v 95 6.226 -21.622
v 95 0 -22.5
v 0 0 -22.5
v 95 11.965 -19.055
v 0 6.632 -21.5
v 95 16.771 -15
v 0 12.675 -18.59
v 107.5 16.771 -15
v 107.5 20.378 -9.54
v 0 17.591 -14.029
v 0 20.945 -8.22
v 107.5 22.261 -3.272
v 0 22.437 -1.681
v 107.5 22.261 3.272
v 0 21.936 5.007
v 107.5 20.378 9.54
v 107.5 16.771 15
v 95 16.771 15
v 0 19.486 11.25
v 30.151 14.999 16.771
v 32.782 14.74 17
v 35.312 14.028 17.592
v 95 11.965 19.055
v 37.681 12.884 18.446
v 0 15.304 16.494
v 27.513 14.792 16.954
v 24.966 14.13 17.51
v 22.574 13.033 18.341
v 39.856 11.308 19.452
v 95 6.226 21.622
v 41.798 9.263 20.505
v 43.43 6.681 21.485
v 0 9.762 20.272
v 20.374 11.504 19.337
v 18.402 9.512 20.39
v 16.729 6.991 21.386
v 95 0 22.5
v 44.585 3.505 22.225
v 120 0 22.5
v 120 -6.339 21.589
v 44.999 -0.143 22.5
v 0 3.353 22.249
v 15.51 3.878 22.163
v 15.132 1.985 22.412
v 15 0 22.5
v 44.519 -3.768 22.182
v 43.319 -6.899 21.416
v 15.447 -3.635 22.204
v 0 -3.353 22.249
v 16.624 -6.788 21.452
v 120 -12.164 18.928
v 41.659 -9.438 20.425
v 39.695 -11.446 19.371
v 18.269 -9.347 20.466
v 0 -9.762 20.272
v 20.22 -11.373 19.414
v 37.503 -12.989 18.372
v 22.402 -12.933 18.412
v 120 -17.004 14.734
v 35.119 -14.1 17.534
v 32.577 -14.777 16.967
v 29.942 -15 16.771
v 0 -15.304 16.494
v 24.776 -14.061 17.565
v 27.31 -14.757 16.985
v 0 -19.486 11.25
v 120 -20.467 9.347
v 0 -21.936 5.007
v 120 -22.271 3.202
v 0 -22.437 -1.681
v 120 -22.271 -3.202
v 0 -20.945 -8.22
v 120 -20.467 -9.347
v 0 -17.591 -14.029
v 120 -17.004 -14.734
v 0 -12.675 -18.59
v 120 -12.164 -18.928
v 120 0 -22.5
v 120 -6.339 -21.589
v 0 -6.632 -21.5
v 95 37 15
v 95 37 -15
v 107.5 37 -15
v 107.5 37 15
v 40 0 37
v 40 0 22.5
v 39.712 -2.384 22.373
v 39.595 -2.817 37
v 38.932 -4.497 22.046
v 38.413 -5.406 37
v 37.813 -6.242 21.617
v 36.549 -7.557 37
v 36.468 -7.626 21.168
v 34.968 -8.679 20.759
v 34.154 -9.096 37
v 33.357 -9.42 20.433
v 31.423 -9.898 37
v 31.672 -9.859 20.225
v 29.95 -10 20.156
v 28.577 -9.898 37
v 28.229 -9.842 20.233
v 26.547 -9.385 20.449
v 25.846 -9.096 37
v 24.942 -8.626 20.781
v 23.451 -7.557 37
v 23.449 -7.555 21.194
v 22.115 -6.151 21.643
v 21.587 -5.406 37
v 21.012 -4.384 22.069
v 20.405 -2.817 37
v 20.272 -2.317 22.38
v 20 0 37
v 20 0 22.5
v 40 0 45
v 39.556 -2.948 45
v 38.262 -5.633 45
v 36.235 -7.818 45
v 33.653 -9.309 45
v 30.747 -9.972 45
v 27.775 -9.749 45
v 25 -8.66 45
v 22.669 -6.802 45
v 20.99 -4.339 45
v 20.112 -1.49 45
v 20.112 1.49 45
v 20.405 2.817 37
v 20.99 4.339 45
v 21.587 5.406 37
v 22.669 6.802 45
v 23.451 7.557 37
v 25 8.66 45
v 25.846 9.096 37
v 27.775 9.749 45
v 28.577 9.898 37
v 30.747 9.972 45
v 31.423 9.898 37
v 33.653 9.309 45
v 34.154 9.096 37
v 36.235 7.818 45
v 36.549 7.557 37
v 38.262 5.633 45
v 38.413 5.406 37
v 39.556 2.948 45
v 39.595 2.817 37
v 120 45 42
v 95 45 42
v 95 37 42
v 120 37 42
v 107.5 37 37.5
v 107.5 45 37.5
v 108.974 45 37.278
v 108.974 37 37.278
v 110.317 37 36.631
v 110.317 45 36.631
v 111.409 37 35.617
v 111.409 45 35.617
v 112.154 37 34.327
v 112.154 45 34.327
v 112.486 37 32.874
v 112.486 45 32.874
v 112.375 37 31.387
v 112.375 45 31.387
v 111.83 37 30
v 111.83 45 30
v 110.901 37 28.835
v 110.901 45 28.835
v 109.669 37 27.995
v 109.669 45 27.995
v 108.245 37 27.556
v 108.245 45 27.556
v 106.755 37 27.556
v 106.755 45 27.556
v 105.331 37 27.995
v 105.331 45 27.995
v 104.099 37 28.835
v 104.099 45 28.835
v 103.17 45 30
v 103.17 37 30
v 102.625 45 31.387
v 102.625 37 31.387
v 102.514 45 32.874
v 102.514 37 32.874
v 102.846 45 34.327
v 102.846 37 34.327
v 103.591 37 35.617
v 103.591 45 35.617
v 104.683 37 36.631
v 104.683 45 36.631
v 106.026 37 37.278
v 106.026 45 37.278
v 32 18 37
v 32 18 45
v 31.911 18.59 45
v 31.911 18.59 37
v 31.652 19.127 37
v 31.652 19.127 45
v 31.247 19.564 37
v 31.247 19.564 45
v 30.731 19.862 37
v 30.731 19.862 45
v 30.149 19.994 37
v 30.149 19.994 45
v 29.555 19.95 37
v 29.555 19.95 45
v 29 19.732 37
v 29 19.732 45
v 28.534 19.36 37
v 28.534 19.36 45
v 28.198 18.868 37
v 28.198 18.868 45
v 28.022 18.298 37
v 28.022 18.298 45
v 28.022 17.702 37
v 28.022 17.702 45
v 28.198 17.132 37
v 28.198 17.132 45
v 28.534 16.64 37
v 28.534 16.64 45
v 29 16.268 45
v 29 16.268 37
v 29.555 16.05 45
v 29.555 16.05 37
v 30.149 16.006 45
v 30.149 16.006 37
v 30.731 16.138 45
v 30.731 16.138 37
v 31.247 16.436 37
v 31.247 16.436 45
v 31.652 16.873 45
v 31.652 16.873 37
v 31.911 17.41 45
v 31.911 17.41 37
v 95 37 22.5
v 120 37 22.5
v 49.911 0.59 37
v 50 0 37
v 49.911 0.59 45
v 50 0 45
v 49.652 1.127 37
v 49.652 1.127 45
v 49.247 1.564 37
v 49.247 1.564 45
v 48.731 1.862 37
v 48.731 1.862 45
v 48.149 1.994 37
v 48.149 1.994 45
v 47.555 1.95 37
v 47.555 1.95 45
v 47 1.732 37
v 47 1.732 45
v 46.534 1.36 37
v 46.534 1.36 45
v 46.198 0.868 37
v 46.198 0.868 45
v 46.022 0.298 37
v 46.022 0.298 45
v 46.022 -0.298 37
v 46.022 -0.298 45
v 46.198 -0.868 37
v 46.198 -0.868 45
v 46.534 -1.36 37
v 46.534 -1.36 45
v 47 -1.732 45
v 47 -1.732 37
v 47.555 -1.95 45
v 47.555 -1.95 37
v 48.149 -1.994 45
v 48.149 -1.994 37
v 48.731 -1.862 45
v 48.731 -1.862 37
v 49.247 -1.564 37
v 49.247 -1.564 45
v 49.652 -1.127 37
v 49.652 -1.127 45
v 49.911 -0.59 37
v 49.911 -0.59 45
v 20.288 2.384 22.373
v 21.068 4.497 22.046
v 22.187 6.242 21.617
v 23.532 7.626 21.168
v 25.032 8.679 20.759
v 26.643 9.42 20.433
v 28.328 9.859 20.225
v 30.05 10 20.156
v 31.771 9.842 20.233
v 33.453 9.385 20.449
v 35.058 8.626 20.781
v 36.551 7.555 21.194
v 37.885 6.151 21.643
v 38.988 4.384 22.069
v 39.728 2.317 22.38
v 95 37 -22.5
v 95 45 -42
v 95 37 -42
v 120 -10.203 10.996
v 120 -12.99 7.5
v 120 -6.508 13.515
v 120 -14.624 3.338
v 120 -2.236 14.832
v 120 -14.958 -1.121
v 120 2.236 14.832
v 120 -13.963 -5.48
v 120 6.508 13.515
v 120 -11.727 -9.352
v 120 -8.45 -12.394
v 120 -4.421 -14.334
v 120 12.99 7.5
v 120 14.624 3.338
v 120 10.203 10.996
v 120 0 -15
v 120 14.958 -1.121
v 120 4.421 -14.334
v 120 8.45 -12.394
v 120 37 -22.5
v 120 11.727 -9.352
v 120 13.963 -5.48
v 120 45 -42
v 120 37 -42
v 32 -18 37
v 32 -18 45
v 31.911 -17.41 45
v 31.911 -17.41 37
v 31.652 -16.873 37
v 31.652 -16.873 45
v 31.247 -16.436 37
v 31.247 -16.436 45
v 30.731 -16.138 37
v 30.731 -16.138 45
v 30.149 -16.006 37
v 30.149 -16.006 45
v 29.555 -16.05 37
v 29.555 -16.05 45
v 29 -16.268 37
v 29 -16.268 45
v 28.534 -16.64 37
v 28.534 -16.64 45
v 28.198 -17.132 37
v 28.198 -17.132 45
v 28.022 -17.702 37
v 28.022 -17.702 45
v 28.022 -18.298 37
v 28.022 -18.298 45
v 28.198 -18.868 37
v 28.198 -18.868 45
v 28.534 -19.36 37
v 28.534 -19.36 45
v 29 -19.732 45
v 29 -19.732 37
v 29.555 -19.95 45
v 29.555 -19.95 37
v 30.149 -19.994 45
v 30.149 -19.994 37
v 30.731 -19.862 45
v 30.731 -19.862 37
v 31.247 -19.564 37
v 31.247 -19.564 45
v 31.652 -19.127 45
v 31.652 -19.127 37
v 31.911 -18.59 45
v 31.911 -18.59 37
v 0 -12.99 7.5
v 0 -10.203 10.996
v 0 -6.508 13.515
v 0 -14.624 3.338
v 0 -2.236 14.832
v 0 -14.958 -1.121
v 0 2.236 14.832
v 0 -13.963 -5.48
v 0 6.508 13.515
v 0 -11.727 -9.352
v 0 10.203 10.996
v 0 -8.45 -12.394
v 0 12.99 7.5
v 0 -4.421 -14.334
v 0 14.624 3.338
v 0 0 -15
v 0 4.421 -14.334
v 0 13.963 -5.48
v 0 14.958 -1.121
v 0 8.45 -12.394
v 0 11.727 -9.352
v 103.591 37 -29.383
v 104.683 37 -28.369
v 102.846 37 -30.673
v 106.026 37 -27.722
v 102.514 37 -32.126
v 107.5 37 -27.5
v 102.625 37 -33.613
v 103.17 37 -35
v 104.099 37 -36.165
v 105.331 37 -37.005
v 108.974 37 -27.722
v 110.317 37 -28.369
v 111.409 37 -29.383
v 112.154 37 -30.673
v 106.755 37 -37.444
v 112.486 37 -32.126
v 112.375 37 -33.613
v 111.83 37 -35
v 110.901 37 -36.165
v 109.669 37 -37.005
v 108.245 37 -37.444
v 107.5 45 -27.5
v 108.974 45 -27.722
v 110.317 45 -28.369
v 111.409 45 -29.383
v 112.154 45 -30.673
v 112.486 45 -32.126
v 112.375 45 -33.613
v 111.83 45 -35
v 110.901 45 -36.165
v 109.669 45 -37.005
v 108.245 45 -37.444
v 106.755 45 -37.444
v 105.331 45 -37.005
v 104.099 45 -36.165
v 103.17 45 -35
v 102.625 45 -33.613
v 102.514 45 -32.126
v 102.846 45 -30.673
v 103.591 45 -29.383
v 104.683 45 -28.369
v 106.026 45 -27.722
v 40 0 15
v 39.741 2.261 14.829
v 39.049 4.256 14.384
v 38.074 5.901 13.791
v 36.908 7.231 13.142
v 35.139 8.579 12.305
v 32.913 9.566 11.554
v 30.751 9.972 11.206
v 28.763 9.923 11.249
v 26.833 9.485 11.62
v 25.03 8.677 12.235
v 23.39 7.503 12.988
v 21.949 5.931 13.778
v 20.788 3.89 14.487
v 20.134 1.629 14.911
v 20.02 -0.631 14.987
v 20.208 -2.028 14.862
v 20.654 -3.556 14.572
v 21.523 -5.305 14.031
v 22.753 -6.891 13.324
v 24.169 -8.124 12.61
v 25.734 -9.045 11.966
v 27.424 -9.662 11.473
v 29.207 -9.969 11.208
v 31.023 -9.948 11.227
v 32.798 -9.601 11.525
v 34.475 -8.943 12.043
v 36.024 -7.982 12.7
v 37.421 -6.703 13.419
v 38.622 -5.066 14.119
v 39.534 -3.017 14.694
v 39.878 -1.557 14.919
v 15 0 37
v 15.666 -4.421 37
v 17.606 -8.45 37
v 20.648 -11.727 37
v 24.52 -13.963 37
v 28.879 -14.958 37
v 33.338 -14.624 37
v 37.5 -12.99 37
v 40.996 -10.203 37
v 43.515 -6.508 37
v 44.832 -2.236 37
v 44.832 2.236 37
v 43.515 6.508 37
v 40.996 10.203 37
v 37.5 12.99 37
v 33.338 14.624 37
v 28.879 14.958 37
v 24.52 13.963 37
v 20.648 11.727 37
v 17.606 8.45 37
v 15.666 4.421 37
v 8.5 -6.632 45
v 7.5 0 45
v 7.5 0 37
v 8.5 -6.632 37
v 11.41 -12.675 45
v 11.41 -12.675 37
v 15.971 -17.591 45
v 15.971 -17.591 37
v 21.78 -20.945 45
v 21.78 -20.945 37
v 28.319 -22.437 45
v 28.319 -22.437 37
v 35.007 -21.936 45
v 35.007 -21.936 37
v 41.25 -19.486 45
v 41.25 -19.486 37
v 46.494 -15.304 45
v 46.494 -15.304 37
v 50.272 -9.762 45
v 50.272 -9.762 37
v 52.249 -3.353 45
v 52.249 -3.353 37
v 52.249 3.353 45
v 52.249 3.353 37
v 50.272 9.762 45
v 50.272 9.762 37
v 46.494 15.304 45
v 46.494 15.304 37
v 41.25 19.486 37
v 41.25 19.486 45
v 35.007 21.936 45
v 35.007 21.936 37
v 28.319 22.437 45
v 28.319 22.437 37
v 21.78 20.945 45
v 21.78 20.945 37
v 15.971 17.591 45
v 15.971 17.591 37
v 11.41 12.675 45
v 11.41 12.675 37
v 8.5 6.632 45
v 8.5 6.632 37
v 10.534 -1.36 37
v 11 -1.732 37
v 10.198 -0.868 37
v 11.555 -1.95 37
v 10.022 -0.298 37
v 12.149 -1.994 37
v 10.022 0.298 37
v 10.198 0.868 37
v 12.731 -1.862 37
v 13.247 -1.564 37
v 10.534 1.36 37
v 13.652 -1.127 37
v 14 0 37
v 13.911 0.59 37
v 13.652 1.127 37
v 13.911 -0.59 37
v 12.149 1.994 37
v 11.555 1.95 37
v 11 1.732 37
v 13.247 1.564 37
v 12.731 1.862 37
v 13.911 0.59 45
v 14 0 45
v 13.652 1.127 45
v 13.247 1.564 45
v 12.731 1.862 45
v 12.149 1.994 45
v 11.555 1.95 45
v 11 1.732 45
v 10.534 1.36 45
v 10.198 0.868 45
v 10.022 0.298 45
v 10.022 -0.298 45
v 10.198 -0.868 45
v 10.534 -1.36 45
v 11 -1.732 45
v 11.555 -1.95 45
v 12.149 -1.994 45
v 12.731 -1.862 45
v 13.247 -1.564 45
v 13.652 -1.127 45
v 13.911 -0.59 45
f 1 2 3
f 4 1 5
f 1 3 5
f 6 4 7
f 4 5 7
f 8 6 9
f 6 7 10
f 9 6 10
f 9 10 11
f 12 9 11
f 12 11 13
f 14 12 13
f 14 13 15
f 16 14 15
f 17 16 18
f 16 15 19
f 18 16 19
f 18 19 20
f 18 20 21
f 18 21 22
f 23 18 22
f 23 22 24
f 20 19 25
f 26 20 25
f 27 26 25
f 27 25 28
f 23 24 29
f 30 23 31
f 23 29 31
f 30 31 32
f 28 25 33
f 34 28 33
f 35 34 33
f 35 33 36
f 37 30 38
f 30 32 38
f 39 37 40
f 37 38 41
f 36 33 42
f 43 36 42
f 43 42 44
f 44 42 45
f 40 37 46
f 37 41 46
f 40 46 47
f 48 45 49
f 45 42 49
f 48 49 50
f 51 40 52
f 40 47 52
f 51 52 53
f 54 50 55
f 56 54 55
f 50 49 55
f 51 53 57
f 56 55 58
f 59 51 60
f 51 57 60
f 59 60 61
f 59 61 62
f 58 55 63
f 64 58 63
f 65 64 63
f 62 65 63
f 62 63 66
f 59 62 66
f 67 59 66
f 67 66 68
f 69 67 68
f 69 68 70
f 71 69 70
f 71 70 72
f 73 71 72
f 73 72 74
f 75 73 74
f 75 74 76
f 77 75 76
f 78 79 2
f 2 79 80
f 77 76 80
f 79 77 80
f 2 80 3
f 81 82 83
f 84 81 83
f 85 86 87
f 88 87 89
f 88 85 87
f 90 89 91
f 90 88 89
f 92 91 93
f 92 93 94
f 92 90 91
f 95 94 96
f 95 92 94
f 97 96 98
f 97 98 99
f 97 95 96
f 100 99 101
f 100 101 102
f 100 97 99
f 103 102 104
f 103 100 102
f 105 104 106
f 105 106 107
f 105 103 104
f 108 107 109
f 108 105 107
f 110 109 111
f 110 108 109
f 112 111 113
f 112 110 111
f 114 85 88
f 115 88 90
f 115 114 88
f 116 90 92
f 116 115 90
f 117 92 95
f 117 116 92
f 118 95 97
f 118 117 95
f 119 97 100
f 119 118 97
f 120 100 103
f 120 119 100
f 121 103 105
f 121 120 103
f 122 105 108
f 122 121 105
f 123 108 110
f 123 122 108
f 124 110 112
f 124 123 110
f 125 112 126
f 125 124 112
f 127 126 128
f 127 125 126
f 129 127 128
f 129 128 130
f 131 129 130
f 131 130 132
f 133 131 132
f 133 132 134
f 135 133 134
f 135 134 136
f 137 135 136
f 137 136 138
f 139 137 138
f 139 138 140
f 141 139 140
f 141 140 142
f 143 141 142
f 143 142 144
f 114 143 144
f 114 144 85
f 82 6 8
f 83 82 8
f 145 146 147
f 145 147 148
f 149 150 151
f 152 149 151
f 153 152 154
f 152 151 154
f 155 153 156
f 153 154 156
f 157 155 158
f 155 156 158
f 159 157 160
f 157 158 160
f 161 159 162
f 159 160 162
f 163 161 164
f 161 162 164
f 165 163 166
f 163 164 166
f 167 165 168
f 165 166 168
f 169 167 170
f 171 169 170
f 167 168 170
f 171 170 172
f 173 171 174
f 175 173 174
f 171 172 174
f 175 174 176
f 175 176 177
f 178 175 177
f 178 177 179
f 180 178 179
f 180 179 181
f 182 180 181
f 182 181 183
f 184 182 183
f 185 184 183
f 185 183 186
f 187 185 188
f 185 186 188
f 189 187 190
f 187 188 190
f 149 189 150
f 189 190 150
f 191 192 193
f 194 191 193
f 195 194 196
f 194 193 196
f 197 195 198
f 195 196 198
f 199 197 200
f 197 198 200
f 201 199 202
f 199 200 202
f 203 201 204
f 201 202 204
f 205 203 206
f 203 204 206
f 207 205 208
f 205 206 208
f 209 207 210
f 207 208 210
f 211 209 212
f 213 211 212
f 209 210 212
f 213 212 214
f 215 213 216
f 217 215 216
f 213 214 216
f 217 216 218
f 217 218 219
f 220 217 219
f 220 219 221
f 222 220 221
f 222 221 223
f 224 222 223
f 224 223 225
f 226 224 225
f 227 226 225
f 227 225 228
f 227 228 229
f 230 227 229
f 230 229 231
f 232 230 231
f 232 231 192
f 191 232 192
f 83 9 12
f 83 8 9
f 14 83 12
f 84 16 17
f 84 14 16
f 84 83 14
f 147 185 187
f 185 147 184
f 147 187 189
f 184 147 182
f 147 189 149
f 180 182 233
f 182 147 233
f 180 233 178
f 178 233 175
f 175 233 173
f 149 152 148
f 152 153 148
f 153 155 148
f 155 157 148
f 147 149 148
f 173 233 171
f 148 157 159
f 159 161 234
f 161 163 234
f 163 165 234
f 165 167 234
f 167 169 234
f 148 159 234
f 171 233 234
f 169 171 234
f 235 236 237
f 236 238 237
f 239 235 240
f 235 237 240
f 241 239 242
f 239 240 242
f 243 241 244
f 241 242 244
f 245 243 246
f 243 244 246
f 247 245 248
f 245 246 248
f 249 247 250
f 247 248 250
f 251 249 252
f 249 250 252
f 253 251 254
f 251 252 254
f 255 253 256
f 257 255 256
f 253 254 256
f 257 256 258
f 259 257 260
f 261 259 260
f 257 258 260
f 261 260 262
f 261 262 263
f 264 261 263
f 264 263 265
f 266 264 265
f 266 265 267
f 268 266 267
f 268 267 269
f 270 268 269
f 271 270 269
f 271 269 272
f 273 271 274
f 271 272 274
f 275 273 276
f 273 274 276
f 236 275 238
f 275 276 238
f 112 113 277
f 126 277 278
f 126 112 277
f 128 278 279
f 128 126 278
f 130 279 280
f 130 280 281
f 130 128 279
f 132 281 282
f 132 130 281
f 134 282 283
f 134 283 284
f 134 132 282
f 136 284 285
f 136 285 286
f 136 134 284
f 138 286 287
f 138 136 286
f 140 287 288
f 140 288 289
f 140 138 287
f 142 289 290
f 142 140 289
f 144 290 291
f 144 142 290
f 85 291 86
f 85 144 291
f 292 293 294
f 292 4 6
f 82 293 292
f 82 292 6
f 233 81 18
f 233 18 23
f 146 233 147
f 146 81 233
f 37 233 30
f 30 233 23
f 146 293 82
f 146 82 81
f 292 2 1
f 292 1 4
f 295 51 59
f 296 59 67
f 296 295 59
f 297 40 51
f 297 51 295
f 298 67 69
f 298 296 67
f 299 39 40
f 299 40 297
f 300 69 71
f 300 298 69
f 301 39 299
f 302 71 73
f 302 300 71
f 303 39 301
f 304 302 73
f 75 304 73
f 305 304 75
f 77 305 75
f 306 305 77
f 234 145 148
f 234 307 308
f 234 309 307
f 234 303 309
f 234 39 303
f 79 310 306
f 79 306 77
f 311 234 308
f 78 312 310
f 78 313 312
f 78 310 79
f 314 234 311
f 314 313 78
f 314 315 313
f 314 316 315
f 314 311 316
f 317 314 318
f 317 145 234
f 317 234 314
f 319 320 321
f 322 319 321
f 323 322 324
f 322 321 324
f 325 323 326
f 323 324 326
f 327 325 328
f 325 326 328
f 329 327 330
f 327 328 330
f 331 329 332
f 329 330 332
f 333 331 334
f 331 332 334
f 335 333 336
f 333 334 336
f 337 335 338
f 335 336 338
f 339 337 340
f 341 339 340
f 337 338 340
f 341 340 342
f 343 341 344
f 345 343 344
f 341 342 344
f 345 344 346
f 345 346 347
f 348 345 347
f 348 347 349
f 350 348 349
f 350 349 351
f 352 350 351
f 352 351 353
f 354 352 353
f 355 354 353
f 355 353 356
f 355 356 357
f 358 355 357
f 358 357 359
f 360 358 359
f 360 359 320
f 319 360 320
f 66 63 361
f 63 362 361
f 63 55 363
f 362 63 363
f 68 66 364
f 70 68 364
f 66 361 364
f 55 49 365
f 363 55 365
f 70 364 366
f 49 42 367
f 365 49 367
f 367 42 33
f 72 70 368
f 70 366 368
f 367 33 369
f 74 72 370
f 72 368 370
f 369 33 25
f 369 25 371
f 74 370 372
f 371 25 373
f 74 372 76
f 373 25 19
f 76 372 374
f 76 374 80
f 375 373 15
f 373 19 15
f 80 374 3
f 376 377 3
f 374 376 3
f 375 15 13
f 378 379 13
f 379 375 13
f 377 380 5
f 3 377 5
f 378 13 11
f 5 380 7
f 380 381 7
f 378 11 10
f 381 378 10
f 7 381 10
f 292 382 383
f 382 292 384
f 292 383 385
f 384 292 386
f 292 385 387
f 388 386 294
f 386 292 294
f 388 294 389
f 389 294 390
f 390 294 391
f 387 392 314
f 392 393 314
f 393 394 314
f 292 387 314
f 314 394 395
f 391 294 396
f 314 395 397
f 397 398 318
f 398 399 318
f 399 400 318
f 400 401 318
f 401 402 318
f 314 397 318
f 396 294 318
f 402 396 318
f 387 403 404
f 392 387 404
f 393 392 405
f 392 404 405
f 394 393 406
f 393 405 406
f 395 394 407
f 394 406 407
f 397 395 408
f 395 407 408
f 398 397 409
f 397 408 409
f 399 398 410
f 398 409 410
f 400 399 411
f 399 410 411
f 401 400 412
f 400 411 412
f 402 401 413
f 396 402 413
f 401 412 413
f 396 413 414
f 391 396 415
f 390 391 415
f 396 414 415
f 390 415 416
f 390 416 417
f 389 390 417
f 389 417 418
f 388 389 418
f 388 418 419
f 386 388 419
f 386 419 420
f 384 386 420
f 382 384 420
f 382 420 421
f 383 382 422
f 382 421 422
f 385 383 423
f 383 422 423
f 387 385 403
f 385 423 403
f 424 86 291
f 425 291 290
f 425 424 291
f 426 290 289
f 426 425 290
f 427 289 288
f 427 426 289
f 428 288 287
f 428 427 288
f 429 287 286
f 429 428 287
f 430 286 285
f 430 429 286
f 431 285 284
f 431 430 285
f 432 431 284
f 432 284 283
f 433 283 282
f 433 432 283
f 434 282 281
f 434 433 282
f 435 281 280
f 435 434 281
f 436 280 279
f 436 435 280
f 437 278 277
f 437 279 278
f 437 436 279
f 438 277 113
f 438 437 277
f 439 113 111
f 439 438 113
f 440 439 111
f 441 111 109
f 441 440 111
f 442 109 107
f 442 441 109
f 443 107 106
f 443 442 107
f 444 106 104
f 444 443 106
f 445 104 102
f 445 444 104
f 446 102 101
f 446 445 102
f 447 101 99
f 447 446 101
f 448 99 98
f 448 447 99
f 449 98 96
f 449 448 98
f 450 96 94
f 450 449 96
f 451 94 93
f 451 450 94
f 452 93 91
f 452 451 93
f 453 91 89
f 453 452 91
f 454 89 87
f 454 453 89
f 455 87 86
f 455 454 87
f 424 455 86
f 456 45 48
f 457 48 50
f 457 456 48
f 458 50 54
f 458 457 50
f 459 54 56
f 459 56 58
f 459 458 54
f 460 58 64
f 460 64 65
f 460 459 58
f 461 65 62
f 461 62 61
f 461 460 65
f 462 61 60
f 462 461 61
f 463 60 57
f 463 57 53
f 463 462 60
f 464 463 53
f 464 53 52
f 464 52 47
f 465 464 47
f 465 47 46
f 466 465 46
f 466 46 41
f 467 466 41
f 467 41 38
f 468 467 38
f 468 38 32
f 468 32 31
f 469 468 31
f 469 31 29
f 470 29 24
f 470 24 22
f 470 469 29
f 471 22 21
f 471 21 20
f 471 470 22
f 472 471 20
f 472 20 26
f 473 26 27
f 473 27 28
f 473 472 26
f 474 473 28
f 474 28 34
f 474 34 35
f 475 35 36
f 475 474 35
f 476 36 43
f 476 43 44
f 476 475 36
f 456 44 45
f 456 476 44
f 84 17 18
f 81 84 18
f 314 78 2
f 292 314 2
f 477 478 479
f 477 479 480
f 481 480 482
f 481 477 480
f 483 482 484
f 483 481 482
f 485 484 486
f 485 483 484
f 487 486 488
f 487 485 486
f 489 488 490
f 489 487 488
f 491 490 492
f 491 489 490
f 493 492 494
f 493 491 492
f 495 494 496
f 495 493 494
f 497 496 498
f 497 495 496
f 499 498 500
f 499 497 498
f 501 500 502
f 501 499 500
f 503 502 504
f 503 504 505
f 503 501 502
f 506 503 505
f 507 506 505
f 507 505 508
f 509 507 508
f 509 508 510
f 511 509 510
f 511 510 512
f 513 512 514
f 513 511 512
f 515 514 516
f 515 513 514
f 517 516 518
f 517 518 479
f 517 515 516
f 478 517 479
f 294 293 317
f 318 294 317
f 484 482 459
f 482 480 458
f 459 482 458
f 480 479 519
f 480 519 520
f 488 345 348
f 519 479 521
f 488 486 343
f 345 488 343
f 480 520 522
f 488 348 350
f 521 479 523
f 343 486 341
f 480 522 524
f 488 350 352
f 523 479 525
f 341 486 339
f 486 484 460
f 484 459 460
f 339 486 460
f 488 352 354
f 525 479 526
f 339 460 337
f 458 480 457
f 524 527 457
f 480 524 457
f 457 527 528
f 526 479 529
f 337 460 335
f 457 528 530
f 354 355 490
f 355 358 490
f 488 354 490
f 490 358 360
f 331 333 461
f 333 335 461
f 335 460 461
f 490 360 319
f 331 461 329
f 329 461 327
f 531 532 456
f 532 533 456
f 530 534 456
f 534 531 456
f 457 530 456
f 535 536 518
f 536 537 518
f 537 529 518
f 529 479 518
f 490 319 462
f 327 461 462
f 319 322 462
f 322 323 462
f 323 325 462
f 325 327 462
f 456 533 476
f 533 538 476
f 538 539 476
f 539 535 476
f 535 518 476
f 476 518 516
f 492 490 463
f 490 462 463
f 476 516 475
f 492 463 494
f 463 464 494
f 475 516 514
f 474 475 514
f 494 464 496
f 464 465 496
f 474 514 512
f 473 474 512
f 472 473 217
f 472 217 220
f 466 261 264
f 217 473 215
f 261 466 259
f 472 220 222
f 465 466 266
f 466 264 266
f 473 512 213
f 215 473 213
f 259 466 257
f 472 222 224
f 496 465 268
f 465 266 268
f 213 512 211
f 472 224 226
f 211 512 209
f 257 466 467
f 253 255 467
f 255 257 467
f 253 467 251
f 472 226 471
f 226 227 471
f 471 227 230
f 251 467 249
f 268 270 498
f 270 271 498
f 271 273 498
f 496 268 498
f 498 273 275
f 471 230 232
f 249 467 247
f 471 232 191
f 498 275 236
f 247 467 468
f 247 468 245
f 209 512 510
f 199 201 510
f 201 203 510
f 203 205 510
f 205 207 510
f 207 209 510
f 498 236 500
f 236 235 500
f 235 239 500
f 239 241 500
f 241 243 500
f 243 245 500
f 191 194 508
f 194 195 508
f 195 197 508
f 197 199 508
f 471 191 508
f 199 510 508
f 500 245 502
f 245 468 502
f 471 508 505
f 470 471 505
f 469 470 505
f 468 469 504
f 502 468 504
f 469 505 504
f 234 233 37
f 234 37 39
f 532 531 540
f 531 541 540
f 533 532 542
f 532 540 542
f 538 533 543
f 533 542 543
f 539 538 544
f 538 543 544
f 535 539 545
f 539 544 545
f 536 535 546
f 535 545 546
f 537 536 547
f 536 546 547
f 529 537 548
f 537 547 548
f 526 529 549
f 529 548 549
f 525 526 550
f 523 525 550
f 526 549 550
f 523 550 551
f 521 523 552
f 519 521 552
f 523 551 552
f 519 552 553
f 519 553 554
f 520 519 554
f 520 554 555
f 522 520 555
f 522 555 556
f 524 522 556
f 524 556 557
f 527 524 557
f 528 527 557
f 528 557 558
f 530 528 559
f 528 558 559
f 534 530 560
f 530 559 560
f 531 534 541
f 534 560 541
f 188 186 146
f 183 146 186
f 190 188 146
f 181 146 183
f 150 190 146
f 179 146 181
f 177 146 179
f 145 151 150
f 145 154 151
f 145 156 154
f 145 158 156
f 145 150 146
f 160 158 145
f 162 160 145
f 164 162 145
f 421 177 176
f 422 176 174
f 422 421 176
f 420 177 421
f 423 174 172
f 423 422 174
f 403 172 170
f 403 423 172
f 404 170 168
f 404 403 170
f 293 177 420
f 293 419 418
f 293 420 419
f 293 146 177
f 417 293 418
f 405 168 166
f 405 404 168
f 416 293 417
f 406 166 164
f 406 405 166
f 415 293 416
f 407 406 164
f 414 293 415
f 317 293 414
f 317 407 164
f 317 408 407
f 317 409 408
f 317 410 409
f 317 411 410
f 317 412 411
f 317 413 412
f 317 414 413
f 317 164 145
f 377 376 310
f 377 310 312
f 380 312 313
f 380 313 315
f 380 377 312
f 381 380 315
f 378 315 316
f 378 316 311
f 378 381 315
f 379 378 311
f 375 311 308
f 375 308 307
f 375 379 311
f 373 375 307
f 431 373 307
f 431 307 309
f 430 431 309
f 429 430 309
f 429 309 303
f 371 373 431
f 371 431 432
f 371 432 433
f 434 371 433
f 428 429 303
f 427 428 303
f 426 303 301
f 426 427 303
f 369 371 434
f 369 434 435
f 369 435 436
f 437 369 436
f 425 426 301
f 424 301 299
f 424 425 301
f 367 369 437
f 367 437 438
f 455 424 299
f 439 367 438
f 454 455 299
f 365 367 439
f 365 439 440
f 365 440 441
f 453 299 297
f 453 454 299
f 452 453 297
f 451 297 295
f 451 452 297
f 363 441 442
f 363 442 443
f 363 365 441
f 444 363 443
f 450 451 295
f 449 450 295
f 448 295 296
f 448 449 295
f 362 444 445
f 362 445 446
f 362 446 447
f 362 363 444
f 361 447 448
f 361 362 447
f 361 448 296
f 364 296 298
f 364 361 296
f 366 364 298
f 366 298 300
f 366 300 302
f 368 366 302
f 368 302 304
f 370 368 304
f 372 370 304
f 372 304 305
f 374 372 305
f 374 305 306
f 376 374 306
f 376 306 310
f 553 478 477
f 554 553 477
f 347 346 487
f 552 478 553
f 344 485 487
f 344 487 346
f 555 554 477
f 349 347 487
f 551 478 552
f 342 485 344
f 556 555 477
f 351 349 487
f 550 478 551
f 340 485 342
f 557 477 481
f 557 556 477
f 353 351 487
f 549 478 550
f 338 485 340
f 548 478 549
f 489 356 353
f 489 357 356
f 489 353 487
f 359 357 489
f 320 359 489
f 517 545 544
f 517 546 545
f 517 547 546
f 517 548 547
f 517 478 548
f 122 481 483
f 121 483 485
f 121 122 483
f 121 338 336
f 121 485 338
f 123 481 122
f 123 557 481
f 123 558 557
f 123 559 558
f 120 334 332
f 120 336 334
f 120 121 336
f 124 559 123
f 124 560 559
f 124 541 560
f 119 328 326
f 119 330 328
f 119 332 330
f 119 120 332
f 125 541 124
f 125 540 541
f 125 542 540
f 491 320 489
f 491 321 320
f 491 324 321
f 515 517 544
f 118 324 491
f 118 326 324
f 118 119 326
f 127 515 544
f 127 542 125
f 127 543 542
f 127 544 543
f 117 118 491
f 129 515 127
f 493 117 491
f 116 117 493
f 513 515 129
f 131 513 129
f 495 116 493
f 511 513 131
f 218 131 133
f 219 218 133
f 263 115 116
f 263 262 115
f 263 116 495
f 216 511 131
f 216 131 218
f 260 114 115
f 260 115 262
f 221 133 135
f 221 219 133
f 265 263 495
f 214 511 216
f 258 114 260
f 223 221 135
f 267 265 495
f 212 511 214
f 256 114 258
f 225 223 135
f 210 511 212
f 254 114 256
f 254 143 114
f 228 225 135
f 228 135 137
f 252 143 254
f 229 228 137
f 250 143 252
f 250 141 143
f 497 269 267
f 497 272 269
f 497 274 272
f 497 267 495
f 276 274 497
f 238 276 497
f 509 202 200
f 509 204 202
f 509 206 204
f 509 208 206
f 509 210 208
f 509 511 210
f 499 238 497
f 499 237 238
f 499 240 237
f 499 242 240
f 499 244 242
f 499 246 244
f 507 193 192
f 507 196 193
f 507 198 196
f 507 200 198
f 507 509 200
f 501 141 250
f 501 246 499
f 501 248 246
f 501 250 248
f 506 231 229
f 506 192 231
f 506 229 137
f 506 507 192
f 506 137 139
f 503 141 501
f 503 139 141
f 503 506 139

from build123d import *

# Parameters (mm, degrees)
SKETCH_1_R           = 22.5
SKETCH_1_R_2         = 15
EXTRUDE_1_DEPTH      = 120
EXTRUDE_START        = 45
SKETCH_2_W           = 25
SKETCH_2_H           = 19.5
SKETCH_2_R           = 5
SKETCH_2_W_2         = 12.5
SKETCH_2_H_2         = 15
EXTRUDE_5_DEPTH      = 8
EXTRUDE_6_REACH      = 173.867
EXTRUDE_6_END_RADIUS = 22.5
EXTRUDE_START_2      = 37
EXTRUDE_7_DEPTH      = 8
EXTRUDE_8_REACH      = 174.831
EXTRUDE_8_END_RADIUS = 22.5
CUT_EXTRUDE_1_REACH  = 137.831
SKETCH_3_4_R         = 10
CUT_EXTRUDE_2_REACH  = 156.9
SKETCH_4_R           = 2


with BuildPart() as part:
    # 草图1 → 凸台-拉伸1 (new body)
    with BuildSketch(Plane(origin=(0, 0, 0), x_dir=(0, 0, -1), z_dir=(1, 0, 0))):
        Circle(SKETCH_1_R)
        Circle(SKETCH_1_R_2, mode=Mode.SUBTRACT)
    extrude(amount=EXTRUDE_1_DEPTH)



with BuildPart() as body_2:
    # 草图2 → 凸台-拉伸5 (new body)
    # profile 1 of 6: a face of its own
    with BuildSketch(Plane(origin=(0, 0, 0), x_dir=(1, 0, 0), z_dir=(0, 1, 0)).offset(EXTRUDE_START)):
        Polygon((107.5, 0), (120, 0), (120, 22.5), (95, 22.5), (95, 15), (107.5, 15), align=None)
    # profile 2 of 6: a face of its own
    with BuildSketch(Plane(origin=(0, 0, 0), x_dir=(1, 0, 0), z_dir=(0, 1, 0)).offset(EXTRUDE_START)):
        Polygon((95, -22.5), (120, -22.5), (120, 0), (107.5, 0), (107.5, -15), (95, -15), align=None)
    # profile 3 of 6: a face of its own
    with BuildSketch(Plane(origin=(0, 0, 0), x_dir=(1, 0, 0), z_dir=(0, 1, 0)).offset(EXTRUDE_START)):
        with Locations((107.5, -32.25)):
            Rectangle(SKETCH_2_W, SKETCH_2_H)
        with Locations(Location((107.5, -32.5, 0), (0, 0, 270))):
            Circle(SKETCH_2_R, mode=Mode.SUBTRACT)
    # profile 4 of 6: a face of its own
    with BuildSketch(Plane(origin=(0, 0, 0), x_dir=(1, 0, 0), z_dir=(0, 1, 0)).offset(EXTRUDE_START)):
        with Locations((107.5, 32.25)):
            Rectangle(SKETCH_2_W, SKETCH_2_H)
        with Locations(Location((107.5, 32.5, 0), (0, 0, 270))):
            Circle(SKETCH_2_R, mode=Mode.SUBTRACT)
    # profile 5 of 6: a face of its own
    with BuildSketch(Plane(origin=(0, 0, 0), x_dir=(1, 0, 0), z_dir=(0, 1, 0)).offset(EXTRUDE_START)):
        with Locations((101.25, 7.5)):
            Rectangle(SKETCH_2_W_2, SKETCH_2_H_2)
    # profile 6 of 6: a face of its own
    with BuildSketch(Plane(origin=(0, 0, 0), x_dir=(1, 0, 0), z_dir=(0, 1, 0)).offset(EXTRUDE_START)):
        with Locations((101.25, -7.5)):
            Rectangle(SKETCH_2_W_2, SKETCH_2_H_2)
    extrude(amount=-EXTRUDE_5_DEPTH)


with BuildPart() as part_1:
    add(part.part)

    add(body_2.part)  # 凸台-拉伸6 merges body 2
    # 凸台-拉伸6: up to this cylinder (the profile starts outside it)
    extrude_6_end = Plane(origin=(110.625, 0, 0), z_dir=(-1, 0, 0)) * Cylinder(EXTRUDE_6_END_RADIUS, 393.734, mode=Mode.PRIVATE)
    # 草图2<7> → 凸台-拉伸6 (add, up to the surface)
    with BuildSketch(Plane(origin=(0, 0, 0), x_dir=(1, 0, 0), z_dir=(0, 1, 0)).offset(EXTRUDE_START_2), mode=Mode.PRIVATE) as extrude_6_sk1:
        Polygon((95, -22.5), (120, -22.5), (120, 0), (107.5, 0), (107.5, -15), (95, -15), align=None)
    extrude_6_tool1 = extrude(extrude_6_sk1.sketch, amount=-EXTRUDE_6_REACH, mode=Mode.PRIVATE) - extrude_6_end
    add(extrude_6_tool1.solids().sort_by_distance((110.625, 37, 13.125))[0])
    # 草图2<7> → 凸台-拉伸6 (add, up to the surface)
    with BuildSketch(Plane(origin=(0, 0, 0), x_dir=(1, 0, 0), z_dir=(0, 1, 0)).offset(EXTRUDE_START_2), mode=Mode.PRIVATE) as extrude_6_sk2:
        Polygon((107.5, 0), (120, 0), (120, 22.5), (95, 22.5), (95, 15), (107.5, 15), align=None)
    extrude_6_tool2 = extrude(extrude_6_sk2.sketch, amount=-EXTRUDE_6_REACH, mode=Mode.PRIVATE) - extrude_6_end
    add(extrude_6_tool2.solids().sort_by_distance((110.625, 37, -13.125))[0])



with BuildPart() as body_2_2:
    # 草图3 → 凸台-拉伸7 (new body)
    with BuildSketch(Plane.XY.offset(EXTRUDE_START)):
        with BuildLine():
            ThreePointArc((15, 0), (30, 15), (45, 0))
            Line((45, 0), (52.5, 0))
            ThreePointArc((52.5, 0), (30, 22.5), (7.5, 0))
            Line((7.5, 0), (15, 0))
        make_face()
        with BuildLine():
            Line((52.5, 0), (45, 0))
            ThreePointArc((45, 0), (30, -15), (15, 0))
            Line((15, 0), (7.5, 0))
            ThreePointArc((7.5, 0), (30, -22.5), (52.5, 0))
        make_face()
        with BuildLine():
            ThreePointArc((15, 0), (30, 15), (45, 0))
            Line((45, 0), (52.5, 0))
            ThreePointArc((52.5, 0), (30, 22.5), (7.5, 0))
            Line((7.5, 0), (15, 0))
        make_face()
        with BuildLine():
            Line((52.5, 0), (45, 0))
            ThreePointArc((45, 0), (30, -15), (15, 0))
            Line((15, 0), (7.5, 0))
            ThreePointArc((7.5, 0), (30, -22.5), (52.5, 0))
        make_face()
        with BuildLine():
            ThreePointArc((20, 0), (30, 10), (40, 0))
            Line((40, 0), (45, 0))
            ThreePointArc((45, 0), (30, 15), (15, 0))
            Line((15, 0), (20, 0))
        make_face()
        with BuildLine():
            Line((45, 0), (40, 0))
            ThreePointArc((40, 0), (30, -10), (20, 0))
            Line((20, 0), (15, 0))
            ThreePointArc((15, 0), (30, -15), (45, 0))
        make_face()
        with BuildLine():
            ThreePointArc((20, 0), (30, 10), (40, 0))
            Line((40, 0), (45, 0))
            ThreePointArc((45, 0), (30, 15), (15, 0))
            Line((15, 0), (20, 0))
        make_face()
        with BuildLine():
            Line((45, 0), (40, 0))
            ThreePointArc((40, 0), (30, -10), (20, 0))
            Line((20, 0), (15, 0))
            ThreePointArc((15, 0), (30, -15), (45, 0))
        make_face()
    extrude(amount=-EXTRUDE_7_DEPTH)


with BuildPart() as part_2:
    add(part_1.part)

    add(body_2_2.part)  # 凸台-拉伸8 merges body 2 2
    # 凸台-拉伸8: up to this cylinder (the profile starts outside it)
    extrude_8_end = Plane(origin=(30, 0, 0), z_dir=(-1, 0, 0)) * Cylinder(EXTRUDE_8_END_RADIUS, 420.662, mode=Mode.PRIVATE)
    # 草图3<3> → 凸台-拉伸8 (add, up to the surface)
    with BuildSketch(Plane.XY.offset(EXTRUDE_START_2), mode=Mode.PRIVATE) as extrude_8_sk1:
        with BuildLine():
            ThreePointArc((20, 0), (30, 10), (40, 0))
            Line((40, 0), (45, 0))
            ThreePointArc((45, 0), (30, 15), (15, 0))
            Line((15, 0), (20, 0))
        make_face()
    extrude_8_tool1 = extrude(extrude_8_sk1.sketch, amount=-EXTRUDE_8_REACH, mode=Mode.PRIVATE) - extrude_8_end
    add(extrude_8_tool1.solids().sort_by_distance((17.5, 0.33541, 37))[0])
    # 草图3<3> → 凸台-拉伸8 (add, up to the surface)
    with BuildSketch(Plane.XY.offset(EXTRUDE_START_2), mode=Mode.PRIVATE) as extrude_8_sk2:
        with BuildLine():
            Line((45, 0), (40, 0))
            ThreePointArc((40, 0), (30, -10), (20, 0))
            Line((20, 0), (15, 0))
            ThreePointArc((15, 0), (30, -15), (45, 0))
        make_face()
    extrude_8_tool2 = extrude(extrude_8_sk2.sketch, amount=-EXTRUDE_8_REACH, mode=Mode.PRIVATE) - extrude_8_end
    add(extrude_8_tool2.solids().sort_by_distance((42.5, -0.33541, 37))[0])
    # 草图3<3> → 凸台-拉伸8 (add, up to the surface)
    with BuildSketch(Plane.XY.offset(EXTRUDE_START_2), mode=Mode.PRIVATE) as extrude_8_sk3:
        with BuildLine():
            ThreePointArc((20, 0), (30, 10), (40, 0))
            Line((40, 0), (45, 0))
            ThreePointArc((45, 0), (30, 15), (15, 0))
            Line((15, 0), (20, 0))
        make_face()
    extrude_8_tool3 = extrude(extrude_8_sk3.sketch, amount=-EXTRUDE_8_REACH, mode=Mode.PRIVATE) - extrude_8_end
    add(extrude_8_tool3.solids().sort_by_distance((17.5, 0.33541, 37))[0])
    # 草图3<3> → 凸台-拉伸8 (add, up to the surface)
    with BuildSketch(Plane.XY.offset(EXTRUDE_START_2), mode=Mode.PRIVATE) as extrude_8_sk4:
        with BuildLine():
            Line((45, 0), (40, 0))
            ThreePointArc((40, 0), (30, -10), (20, 0))
            Line((20, 0), (15, 0))
            ThreePointArc((15, 0), (30, -15), (45, 0))
        make_face()
    extrude_8_tool4 = extrude(extrude_8_sk4.sketch, amount=-EXTRUDE_8_REACH, mode=Mode.PRIVATE) - extrude_8_end
    add(extrude_8_tool4.solids().sort_by_distance((42.5, -0.33541, 37))[0])

    # 草图3<4> → 切除-拉伸1 (cut, up to next)
    with BuildSketch(Plane.XY, mode=Mode.PRIVATE) as cut_extrude_1_sk1:
        with Locations((30, 0)):
            Circle(SKETCH_3_4_R)
    cut_extrude_1_tool1 = extrude(cut_extrude_1_sk1.sketch, amount=CUT_EXTRUDE_1_REACH, mode=Mode.PRIVATE) & part_2.part
    add(cut_extrude_1_tool1.solids().sort_by_distance((30, 0, 0))[0], mode=Mode.SUBTRACT)

    # 草图4 → 切除-拉伸2 (cut, up to next)
    with BuildSketch(Plane.XY.offset(45), mode=Mode.PRIVATE) as cut_extrude_2_sk1:
        with Locations((30, 18)):
            Circle(SKETCH_4_R)
    cut_extrude_2_tool1 = extrude(cut_extrude_2_sk1.sketch, amount=-CUT_EXTRUDE_2_REACH, mode=Mode.PRIVATE) & part_2.part
    # 草图4 → 切除-拉伸2 (cut, up to next)
    with BuildSketch(Plane.XY.offset(45), mode=Mode.PRIVATE) as cut_extrude_2_sk2:
        with Locations((48, 0)):
            Circle(SKETCH_4_R)
    cut_extrude_2_tool2 = extrude(cut_extrude_2_sk2.sketch, amount=-CUT_EXTRUDE_2_REACH, mode=Mode.PRIVATE) & part_2.part
    # 草图4 → 切除-拉伸2 (cut, up to next)
    with BuildSketch(Plane.XY.offset(45), mode=Mode.PRIVATE) as cut_extrude_2_sk3:
        with Locations((30, -18)):
            Circle(SKETCH_4_R)
    cut_extrude_2_tool3 = extrude(cut_extrude_2_sk3.sketch, amount=-CUT_EXTRUDE_2_REACH, mode=Mode.PRIVATE) & part_2.part
    # 草图4 → 切除-拉伸2 (cut, up to next)
    with BuildSketch(Plane.XY.offset(45), mode=Mode.PRIVATE) as cut_extrude_2_sk4:
        with Locations((12, 0)):
            Circle(SKETCH_4_R)
    cut_extrude_2_tool4 = extrude(cut_extrude_2_sk4.sketch, amount=-CUT_EXTRUDE_2_REACH, mode=Mode.PRIVATE) & part_2.part
    add(cut_extrude_2_tool1.solids().sort_by_distance((30, 18, 45))[0], mode=Mode.SUBTRACT)
    add(cut_extrude_2_tool2.solids().sort_by_distance((48, 0, 45))[0], mode=Mode.SUBTRACT)
    add(cut_extrude_2_tool3.solids().sort_by_distance((30, -18, 45))[0], mode=Mode.SUBTRACT)
    add(cut_extrude_2_tool4.solids().sort_by_distance((12, 0, 45))[0], mode=Mode.SUBTRACT)


solid = part_2.part
